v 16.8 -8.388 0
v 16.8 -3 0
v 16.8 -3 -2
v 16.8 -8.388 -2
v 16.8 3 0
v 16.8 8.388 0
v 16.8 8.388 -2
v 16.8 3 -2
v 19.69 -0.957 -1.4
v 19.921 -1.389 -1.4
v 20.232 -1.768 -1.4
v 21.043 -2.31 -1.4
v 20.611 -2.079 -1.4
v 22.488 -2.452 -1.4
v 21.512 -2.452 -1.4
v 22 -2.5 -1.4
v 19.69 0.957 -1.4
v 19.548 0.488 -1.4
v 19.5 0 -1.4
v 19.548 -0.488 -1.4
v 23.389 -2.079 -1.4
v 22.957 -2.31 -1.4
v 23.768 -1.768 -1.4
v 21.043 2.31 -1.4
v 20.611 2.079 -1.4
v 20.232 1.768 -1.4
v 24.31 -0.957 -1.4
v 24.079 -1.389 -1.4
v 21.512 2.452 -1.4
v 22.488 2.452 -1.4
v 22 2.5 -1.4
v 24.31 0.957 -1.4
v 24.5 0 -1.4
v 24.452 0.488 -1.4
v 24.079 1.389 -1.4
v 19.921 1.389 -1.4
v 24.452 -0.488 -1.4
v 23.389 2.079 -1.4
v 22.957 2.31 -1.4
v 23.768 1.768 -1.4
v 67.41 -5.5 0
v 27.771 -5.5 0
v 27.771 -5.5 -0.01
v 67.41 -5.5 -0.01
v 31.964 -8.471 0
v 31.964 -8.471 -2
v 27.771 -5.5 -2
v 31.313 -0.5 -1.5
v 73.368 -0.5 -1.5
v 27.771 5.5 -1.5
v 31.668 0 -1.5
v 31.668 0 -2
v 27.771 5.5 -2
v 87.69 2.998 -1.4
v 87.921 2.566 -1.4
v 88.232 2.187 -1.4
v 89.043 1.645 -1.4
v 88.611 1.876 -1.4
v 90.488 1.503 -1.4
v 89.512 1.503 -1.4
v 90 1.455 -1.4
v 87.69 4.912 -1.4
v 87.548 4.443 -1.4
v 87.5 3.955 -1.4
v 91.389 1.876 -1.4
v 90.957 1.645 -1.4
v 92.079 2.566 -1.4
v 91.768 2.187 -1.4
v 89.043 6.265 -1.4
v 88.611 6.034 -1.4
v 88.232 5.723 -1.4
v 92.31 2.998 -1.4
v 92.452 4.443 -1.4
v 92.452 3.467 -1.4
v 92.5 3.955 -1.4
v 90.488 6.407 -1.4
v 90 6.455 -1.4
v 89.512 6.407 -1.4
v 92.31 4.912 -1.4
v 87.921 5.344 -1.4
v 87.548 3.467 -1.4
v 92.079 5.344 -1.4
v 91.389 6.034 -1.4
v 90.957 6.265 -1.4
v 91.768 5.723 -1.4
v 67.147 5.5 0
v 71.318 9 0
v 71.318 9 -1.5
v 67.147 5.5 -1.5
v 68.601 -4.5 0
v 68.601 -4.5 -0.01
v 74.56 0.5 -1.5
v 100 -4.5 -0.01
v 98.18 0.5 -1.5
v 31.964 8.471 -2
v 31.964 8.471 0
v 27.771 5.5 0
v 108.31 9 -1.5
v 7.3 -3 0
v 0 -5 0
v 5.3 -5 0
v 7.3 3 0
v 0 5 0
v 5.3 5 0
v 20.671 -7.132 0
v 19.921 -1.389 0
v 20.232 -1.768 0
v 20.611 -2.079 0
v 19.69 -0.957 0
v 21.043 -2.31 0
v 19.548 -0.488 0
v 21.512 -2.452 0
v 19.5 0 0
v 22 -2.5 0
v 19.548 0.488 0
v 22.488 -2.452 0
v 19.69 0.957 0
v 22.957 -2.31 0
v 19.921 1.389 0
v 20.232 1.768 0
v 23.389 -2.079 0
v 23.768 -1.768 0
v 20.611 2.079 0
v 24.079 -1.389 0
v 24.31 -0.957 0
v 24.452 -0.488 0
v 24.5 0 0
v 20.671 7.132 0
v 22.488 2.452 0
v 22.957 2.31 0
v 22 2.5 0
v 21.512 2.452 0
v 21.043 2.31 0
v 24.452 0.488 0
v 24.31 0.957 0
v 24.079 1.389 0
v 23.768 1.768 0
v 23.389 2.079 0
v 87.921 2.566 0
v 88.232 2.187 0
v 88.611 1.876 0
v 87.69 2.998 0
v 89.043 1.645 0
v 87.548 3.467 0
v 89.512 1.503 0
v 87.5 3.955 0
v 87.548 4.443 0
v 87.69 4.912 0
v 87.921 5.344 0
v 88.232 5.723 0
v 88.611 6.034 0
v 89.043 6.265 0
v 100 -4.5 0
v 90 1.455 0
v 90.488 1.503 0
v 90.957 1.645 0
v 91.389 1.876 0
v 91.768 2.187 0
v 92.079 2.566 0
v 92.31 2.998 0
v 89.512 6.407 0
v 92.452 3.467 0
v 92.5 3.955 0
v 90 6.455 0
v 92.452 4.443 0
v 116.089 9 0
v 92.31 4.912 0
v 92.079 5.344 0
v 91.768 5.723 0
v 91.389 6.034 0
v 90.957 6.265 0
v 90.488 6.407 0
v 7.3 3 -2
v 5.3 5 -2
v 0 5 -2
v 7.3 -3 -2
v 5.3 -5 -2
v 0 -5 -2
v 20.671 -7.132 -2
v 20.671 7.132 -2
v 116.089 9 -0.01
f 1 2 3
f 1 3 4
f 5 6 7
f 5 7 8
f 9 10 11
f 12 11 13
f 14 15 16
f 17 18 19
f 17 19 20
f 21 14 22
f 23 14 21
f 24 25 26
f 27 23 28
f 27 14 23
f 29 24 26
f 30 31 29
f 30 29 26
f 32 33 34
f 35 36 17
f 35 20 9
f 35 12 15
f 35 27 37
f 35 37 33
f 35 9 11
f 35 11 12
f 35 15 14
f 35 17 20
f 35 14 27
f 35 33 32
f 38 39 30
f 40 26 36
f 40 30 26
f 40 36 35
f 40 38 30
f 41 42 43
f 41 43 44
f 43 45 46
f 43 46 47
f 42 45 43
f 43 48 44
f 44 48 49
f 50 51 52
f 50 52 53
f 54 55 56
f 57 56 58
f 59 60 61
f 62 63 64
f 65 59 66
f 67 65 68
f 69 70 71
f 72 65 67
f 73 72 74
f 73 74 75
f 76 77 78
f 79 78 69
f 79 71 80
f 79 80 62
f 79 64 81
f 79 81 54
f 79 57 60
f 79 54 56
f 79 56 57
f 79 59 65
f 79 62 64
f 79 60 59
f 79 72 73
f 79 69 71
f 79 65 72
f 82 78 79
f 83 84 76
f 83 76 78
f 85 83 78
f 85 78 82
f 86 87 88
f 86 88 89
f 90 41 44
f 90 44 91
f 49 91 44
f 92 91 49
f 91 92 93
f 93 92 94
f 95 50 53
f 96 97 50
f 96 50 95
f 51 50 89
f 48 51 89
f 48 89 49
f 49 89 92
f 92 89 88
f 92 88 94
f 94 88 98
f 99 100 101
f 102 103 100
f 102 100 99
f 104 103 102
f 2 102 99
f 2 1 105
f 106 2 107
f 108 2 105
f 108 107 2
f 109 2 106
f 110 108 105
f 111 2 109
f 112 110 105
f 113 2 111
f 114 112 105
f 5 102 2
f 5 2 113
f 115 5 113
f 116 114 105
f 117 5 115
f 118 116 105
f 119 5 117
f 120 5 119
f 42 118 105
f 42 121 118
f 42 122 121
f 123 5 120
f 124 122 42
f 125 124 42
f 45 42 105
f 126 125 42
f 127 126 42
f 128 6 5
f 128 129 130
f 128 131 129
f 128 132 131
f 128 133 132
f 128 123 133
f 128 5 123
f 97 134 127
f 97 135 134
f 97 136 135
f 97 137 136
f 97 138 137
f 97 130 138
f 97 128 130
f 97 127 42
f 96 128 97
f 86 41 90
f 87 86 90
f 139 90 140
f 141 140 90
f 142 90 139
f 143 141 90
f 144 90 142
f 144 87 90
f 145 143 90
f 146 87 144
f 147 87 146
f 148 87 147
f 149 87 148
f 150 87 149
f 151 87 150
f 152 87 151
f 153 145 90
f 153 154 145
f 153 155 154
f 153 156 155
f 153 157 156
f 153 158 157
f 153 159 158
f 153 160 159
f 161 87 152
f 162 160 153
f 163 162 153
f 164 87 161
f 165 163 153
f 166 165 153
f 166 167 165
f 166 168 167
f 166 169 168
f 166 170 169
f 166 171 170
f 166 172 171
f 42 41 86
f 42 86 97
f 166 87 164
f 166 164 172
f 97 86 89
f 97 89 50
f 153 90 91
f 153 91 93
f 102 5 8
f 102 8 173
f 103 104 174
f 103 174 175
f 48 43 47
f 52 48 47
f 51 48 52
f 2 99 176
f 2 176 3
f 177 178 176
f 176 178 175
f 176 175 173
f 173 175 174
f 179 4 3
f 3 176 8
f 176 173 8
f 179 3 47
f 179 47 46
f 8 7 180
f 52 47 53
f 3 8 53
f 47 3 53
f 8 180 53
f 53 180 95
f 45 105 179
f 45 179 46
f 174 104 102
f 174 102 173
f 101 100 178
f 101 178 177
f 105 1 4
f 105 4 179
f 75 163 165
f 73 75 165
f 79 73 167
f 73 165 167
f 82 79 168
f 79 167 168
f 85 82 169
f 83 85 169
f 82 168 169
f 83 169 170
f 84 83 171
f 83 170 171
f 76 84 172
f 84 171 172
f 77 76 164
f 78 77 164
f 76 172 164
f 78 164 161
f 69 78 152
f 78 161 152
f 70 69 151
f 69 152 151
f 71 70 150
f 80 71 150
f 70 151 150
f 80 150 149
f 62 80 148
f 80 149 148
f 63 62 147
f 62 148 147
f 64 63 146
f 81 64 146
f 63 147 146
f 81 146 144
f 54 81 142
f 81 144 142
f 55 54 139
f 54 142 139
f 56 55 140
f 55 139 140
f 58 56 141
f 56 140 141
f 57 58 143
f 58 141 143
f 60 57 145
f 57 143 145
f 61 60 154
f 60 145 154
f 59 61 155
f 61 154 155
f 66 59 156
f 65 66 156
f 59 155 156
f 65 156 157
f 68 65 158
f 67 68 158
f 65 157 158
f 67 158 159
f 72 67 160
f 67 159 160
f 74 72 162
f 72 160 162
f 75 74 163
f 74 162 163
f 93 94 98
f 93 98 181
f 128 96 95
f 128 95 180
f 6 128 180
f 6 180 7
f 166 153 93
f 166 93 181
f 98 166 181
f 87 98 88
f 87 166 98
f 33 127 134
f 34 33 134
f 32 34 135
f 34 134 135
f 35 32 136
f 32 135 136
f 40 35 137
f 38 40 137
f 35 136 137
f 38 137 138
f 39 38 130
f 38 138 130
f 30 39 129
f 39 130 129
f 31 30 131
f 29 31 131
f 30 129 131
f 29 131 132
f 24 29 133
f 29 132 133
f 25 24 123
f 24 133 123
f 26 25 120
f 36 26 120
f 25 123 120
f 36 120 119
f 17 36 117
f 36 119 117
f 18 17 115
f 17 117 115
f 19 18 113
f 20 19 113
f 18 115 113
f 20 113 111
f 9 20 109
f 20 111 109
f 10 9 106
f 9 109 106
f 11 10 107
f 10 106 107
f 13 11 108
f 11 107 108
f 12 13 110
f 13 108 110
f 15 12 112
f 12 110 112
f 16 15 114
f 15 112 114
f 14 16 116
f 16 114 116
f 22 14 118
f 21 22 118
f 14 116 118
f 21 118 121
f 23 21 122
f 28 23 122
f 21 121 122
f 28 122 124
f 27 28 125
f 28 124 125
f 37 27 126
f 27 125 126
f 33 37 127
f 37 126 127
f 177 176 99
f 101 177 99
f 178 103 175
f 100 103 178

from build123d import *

# Parameters (mm, degrees)
F1_DEPTH = 2
F2_DEPTH = 1.5
F3_SIZE2 = 5
F3_SIZE  = 1.49
F4_SIZE2 = 5
F4_SIZE  = 1.49
F5_SIZE2 = 5
F5_SIZE  = 1.49
F6_SIZE  = 1.99999
F7_R     = 2.5
F8_DEPTH = 1.4


# Not quite as in the source:
# - a fillet or chamfer is up to 0.001 mm smaller than in the source, because OpenCascade refuses the exact size


with BuildPart() as f1:
    # F0 (on Top) → F1 (new body)
    with BuildSketch(Plane.XY):
        Polygon((0, 5), (0, 0), (0, -5), (7.3, -5), (7.3, -3), (16.8, -3), (16.8, -8.3876634017), (20.6713799321, -7.1317504184), (31.9639886349, -8.4706461057), (27.770944377, -5.5), (31.6675294298, 0), (27.770944377, 5.5), (31.9639886349, 8.4706461057), (20.6713799321, 7.1317504184), (16.8, 8.3876634017), (16.8, 3), (7.3, 3), (7.3, 5), align=None)
    extrude(amount=-F1_DEPTH)

    # F0 (on Top) → F2 (join)
    with BuildSketch(Plane.XY):
        Polygon((0, 5), (0, 0), (0, -5), (7.3, -5), (7.3, -3), (16.8, -3), (16.8, -8.3876634017), (20.6713799321, -7.1317504184), (31.9639886349, -8.4706461057), (27.770944377, -5.5), (31.6675294298, 0), (27.770944377, 5.5), (31.9639886349, 8.4706461057), (20.6713799321, 7.1317504184), (16.8, 8.3876634017), (16.8, 3), (7.3, 3), (7.3, 5), align=None)
        Polygon((67.1471691582, 5.5), (27.770944377, 5.5), (31.6675294298, 0), (27.770944377, -5.5), (67.4096829149, -5.5), (68.6014365075, -4.5), (100, -4.5), (116.0886735, 9), (71.3183067322, 9), align=None)
    extrude(amount=-F2_DEPTH)

    # F3
    f3_edges = [f1.edges().sort_by_distance(p)[0] for p in [
        (84.300718, -4.5, -1.5),
    ]]
    f3_side = f1.faces().sort_by_distance((84.300718, -4.5, -0.75))[0]
    chamfer(f3_edges, length=F3_SIZE, length2=F3_SIZE2, reference=f3_side)

    # F4
    f4_edges = [f1.edges().sort_by_distance(p)[0] for p in [
        (47.590314, -5.5, -1.5),
    ]]
    f4_side = f1.faces().sort_by_distance((47.590314, -5.5, -0.75))[0]
    chamfer(f4_edges, length=F4_SIZE, length2=F4_SIZE2, reference=f4_side)

    # F5
    f5_edges = [f1.edges().sort_by_distance(p)[0] for p in [
        (111.023721, 4.75, -1.5),
    ]]
    f5_side = f1.faces().sort_by_distance((109.409925, 3.395865, -0.692895))[0]
    chamfer(f5_edges, length=F5_SIZE, length2=F5_SIZE2, reference=f5_side)

    # F6 (size 2 in the source; OpenCascade refuses exactly that, so slightly less here)
    f6_edges = [f1.edges().sort_by_distance(p)[0] for p in [
        (7.3, 5, -1),
        (7.3, -5, -1),
    ]]
    chamfer(f6_edges, length=F6_SIZE)

    # F7 (on Top) → F8 (cut)
    with BuildSketch(Plane.XY):
        with Locations((22, 0)):
            Circle(F7_R)
        with Locations((90, 3.9548357017)):
            Circle(F7_R)
    extrude(amount=-F8_DEPTH, mode=Mode.SUBTRACT)


solid = f1.part
